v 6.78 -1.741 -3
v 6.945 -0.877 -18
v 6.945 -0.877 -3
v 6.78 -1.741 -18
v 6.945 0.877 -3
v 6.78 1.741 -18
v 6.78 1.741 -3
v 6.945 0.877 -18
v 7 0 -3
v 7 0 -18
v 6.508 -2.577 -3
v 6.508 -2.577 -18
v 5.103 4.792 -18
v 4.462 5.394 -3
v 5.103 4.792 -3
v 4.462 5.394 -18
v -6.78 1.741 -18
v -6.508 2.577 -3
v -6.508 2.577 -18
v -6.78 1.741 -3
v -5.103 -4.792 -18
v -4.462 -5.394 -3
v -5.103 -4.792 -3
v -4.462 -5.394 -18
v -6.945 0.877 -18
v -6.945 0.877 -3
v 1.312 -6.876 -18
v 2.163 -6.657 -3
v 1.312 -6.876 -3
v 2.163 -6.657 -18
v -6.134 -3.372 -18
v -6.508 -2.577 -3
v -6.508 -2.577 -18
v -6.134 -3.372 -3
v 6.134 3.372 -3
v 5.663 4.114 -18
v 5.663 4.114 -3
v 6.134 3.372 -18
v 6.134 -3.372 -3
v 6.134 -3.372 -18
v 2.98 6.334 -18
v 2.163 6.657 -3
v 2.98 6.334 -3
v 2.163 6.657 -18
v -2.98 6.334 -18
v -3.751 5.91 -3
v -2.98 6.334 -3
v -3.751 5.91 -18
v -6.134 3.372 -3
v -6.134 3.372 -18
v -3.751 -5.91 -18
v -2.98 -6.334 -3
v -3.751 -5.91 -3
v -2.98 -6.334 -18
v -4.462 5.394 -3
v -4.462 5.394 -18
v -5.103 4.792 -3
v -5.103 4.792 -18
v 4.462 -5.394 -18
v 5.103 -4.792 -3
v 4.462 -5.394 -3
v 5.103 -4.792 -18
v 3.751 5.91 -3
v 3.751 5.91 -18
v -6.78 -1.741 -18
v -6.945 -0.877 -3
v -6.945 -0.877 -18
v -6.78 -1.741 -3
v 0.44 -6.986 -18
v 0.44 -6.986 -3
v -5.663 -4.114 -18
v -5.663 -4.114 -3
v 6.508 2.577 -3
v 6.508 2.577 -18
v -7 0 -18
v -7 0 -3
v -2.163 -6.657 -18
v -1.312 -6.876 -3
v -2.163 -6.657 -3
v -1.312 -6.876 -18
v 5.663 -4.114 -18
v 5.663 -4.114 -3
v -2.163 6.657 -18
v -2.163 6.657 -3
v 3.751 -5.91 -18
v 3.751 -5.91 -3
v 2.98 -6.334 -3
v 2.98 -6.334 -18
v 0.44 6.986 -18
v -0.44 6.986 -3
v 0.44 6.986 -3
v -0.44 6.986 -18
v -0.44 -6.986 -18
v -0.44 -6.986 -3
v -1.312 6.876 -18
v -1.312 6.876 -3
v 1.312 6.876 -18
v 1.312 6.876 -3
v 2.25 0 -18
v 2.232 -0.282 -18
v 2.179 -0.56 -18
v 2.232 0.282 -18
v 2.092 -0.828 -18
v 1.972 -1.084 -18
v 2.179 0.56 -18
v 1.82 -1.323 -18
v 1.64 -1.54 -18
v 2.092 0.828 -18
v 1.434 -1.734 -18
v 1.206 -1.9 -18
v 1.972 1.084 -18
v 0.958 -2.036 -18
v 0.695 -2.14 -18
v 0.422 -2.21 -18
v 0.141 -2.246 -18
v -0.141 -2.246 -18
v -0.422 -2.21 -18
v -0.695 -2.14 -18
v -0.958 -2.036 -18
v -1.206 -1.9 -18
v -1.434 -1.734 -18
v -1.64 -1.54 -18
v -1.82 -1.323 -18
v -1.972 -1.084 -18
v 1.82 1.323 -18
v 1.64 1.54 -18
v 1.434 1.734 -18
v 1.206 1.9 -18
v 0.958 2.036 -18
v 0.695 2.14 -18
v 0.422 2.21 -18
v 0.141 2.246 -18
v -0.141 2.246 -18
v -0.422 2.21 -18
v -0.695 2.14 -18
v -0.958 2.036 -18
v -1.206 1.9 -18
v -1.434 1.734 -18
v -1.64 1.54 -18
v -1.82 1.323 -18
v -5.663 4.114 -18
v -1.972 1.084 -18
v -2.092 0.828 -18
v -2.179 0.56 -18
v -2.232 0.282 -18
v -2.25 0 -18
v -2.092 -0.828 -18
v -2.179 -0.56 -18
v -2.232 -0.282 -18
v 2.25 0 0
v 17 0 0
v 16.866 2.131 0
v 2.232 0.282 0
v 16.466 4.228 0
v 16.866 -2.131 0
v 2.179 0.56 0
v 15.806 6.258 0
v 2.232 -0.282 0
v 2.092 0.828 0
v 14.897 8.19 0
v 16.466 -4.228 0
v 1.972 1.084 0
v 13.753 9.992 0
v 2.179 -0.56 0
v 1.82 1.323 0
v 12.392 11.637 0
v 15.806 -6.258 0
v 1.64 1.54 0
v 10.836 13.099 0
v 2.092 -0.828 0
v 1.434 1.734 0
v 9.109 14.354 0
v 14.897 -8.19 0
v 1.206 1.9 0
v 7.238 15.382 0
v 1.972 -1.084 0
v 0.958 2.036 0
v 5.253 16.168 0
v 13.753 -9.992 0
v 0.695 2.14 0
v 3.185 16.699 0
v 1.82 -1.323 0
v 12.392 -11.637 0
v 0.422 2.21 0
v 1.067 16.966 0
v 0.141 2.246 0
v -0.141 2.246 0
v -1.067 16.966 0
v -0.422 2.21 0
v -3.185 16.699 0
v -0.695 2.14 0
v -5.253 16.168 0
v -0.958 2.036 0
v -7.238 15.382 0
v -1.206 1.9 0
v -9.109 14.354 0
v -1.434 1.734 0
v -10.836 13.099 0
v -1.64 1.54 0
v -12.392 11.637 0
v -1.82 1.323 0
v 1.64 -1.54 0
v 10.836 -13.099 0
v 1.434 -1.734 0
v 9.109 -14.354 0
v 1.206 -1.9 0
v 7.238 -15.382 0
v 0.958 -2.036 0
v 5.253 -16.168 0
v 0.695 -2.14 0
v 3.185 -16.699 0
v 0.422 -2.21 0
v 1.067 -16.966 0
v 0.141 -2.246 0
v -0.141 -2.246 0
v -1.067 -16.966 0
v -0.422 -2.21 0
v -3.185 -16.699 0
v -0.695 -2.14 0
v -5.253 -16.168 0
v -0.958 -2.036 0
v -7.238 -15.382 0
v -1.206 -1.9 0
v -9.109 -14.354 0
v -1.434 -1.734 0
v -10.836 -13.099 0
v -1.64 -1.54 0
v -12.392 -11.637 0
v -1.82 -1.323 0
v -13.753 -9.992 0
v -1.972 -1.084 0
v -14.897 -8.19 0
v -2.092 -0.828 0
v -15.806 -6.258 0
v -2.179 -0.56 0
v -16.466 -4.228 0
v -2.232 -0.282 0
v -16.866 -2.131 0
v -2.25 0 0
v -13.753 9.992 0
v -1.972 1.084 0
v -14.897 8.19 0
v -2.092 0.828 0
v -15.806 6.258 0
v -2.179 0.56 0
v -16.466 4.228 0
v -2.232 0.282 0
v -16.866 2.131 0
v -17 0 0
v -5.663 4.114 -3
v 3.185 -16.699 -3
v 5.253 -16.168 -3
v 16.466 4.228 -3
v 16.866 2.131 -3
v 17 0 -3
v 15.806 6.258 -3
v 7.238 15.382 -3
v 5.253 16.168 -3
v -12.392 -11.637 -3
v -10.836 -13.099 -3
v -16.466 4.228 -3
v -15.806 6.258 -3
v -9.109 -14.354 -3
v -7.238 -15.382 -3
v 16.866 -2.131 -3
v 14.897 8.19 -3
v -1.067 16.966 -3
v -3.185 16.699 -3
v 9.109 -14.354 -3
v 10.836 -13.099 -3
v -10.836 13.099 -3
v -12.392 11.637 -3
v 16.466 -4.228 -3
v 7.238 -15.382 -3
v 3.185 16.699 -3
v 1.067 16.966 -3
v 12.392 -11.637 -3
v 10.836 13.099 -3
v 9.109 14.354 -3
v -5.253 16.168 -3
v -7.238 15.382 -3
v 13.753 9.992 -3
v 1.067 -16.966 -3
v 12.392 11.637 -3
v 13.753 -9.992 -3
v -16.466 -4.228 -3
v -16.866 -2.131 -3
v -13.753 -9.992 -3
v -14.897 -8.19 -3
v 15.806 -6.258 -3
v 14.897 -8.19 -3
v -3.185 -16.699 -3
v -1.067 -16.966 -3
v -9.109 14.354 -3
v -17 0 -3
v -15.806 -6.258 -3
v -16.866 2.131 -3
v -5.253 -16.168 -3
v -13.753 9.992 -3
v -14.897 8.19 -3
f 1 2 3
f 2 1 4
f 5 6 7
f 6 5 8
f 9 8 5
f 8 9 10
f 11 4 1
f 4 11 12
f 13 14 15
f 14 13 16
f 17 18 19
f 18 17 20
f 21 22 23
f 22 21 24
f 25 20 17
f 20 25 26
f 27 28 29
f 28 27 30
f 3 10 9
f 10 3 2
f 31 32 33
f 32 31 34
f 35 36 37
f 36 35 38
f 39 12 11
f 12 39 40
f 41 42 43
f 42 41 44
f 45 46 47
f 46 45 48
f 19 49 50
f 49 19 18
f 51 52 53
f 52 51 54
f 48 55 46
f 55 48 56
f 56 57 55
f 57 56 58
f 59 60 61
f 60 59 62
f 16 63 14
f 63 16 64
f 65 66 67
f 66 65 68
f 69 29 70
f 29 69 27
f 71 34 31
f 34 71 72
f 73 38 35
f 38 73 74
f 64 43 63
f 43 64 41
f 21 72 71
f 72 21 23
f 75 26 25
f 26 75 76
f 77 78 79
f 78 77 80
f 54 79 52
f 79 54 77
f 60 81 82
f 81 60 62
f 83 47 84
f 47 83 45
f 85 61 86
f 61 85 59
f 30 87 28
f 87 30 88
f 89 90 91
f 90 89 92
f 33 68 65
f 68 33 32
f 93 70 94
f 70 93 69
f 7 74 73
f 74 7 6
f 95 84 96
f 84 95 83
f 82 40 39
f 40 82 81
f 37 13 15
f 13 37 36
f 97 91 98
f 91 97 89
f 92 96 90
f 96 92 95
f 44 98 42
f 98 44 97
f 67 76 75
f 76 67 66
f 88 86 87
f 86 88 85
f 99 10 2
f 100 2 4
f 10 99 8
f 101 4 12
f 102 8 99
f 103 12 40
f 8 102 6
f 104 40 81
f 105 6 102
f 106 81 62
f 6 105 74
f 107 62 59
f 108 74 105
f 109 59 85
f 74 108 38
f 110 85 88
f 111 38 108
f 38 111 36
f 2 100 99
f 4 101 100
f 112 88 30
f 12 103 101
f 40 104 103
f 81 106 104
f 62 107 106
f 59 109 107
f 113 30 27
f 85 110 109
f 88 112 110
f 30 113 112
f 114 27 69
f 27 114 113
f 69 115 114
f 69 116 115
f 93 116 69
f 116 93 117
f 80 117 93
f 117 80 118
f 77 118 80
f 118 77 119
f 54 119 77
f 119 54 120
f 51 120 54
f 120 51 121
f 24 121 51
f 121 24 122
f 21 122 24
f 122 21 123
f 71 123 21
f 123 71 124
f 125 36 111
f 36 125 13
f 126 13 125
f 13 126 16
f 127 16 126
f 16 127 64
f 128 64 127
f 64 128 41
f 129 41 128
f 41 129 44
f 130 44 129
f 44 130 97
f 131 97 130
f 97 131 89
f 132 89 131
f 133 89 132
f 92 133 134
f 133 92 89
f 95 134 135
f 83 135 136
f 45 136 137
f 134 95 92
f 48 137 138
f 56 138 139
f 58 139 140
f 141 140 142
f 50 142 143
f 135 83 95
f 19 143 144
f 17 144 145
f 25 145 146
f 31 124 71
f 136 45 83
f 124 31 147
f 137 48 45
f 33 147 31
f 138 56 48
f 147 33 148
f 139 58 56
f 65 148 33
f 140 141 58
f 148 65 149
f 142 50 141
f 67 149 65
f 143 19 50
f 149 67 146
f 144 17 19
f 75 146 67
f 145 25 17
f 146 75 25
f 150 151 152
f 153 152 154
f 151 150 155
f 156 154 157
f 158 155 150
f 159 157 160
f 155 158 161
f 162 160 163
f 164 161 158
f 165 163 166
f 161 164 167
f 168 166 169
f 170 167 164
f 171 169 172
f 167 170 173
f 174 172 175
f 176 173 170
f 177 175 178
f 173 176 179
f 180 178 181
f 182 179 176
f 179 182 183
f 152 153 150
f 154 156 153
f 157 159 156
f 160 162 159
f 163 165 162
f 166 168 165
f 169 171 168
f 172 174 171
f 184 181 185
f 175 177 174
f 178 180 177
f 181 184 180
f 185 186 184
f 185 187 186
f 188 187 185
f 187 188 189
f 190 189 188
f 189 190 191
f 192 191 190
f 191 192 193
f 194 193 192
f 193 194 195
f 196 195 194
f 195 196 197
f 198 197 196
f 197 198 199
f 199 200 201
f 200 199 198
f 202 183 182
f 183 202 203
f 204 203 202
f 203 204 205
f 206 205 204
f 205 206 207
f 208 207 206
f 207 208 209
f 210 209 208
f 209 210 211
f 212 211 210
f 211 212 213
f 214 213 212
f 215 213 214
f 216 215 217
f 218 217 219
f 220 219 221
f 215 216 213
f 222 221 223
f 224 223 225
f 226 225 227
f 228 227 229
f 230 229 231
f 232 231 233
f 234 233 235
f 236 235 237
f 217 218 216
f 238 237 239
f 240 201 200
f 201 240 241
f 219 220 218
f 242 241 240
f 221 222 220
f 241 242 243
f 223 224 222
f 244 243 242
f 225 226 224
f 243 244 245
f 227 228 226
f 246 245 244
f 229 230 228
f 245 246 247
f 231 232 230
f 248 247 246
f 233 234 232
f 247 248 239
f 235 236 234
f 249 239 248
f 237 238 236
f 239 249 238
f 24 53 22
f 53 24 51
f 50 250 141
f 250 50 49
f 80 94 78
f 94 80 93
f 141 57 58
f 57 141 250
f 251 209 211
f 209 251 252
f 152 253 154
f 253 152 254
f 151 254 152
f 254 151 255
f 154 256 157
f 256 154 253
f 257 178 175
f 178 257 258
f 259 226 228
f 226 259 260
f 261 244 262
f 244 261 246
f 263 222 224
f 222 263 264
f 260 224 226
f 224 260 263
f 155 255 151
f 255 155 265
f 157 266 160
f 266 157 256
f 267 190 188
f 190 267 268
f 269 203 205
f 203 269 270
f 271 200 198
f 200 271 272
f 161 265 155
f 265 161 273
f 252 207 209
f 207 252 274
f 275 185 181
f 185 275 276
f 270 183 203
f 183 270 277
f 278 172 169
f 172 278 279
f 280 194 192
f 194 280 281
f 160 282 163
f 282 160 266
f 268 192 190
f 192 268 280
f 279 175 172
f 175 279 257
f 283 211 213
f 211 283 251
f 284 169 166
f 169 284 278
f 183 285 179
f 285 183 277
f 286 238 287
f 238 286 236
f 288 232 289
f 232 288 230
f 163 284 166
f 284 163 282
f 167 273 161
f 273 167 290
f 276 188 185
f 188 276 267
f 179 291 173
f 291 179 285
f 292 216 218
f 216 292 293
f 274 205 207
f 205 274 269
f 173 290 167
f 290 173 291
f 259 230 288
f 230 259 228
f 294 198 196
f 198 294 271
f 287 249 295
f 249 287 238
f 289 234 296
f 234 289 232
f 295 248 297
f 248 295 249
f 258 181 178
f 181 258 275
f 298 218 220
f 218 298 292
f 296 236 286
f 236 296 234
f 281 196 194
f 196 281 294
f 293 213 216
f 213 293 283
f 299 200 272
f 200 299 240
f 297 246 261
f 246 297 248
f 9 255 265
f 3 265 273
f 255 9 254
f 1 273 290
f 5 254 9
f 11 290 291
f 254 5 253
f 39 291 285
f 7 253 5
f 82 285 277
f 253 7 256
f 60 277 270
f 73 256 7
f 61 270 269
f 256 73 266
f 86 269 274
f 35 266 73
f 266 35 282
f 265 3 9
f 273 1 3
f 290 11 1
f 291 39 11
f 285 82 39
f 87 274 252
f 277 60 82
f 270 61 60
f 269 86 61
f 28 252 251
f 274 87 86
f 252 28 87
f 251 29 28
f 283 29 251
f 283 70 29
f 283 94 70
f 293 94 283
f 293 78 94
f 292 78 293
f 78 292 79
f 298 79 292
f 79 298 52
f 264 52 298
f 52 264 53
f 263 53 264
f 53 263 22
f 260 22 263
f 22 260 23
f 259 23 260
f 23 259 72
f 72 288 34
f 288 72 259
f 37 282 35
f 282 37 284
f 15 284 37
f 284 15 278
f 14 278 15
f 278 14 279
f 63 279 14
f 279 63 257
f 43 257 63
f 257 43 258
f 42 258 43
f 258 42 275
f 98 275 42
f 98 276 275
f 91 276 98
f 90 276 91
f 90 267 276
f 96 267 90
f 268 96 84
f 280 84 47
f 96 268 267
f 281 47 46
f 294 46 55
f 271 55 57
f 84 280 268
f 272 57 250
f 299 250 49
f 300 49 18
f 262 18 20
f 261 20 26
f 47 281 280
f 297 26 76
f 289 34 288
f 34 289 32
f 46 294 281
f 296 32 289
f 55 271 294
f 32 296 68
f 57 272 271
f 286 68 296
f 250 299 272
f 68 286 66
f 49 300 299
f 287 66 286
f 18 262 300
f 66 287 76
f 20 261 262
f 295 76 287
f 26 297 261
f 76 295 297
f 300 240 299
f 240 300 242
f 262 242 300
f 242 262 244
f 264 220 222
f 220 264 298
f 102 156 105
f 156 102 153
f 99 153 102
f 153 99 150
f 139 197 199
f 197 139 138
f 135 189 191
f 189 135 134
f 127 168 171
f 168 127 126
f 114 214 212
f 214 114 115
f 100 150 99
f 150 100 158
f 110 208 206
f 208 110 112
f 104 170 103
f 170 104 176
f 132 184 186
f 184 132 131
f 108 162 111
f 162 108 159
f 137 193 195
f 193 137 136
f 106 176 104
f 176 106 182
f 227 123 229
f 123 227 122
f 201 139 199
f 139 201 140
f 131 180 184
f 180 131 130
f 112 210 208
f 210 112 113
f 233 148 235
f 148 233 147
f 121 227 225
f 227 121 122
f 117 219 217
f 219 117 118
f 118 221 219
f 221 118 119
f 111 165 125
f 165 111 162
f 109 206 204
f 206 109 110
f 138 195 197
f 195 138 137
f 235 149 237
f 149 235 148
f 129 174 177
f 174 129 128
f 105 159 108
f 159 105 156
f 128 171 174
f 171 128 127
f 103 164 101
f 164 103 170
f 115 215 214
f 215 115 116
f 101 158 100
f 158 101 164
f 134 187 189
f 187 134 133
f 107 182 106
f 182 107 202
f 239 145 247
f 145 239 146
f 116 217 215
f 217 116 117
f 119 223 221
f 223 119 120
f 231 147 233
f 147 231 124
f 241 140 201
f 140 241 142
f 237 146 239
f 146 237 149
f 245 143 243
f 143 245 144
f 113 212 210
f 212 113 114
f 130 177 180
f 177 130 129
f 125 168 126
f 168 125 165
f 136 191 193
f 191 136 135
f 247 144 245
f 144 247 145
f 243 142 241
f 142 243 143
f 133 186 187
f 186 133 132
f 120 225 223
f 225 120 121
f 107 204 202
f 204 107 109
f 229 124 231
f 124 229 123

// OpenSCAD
$fn = 50;


difference() {
	union() {
		translate(v = [0, 0, -18.0000000000]) {
			cylinder(h = 18, r = 7.0000000000);
		}
		translate(v = [0, 0, -3.0000000000]) {
			cylinder(h = 3, r = 17.0000000000);
		}
	}
	union() {
		#translate(v = [0, 0, -18]) {
			cylinder(h = 18, r = 2.2500000000);
		}
	}
}
